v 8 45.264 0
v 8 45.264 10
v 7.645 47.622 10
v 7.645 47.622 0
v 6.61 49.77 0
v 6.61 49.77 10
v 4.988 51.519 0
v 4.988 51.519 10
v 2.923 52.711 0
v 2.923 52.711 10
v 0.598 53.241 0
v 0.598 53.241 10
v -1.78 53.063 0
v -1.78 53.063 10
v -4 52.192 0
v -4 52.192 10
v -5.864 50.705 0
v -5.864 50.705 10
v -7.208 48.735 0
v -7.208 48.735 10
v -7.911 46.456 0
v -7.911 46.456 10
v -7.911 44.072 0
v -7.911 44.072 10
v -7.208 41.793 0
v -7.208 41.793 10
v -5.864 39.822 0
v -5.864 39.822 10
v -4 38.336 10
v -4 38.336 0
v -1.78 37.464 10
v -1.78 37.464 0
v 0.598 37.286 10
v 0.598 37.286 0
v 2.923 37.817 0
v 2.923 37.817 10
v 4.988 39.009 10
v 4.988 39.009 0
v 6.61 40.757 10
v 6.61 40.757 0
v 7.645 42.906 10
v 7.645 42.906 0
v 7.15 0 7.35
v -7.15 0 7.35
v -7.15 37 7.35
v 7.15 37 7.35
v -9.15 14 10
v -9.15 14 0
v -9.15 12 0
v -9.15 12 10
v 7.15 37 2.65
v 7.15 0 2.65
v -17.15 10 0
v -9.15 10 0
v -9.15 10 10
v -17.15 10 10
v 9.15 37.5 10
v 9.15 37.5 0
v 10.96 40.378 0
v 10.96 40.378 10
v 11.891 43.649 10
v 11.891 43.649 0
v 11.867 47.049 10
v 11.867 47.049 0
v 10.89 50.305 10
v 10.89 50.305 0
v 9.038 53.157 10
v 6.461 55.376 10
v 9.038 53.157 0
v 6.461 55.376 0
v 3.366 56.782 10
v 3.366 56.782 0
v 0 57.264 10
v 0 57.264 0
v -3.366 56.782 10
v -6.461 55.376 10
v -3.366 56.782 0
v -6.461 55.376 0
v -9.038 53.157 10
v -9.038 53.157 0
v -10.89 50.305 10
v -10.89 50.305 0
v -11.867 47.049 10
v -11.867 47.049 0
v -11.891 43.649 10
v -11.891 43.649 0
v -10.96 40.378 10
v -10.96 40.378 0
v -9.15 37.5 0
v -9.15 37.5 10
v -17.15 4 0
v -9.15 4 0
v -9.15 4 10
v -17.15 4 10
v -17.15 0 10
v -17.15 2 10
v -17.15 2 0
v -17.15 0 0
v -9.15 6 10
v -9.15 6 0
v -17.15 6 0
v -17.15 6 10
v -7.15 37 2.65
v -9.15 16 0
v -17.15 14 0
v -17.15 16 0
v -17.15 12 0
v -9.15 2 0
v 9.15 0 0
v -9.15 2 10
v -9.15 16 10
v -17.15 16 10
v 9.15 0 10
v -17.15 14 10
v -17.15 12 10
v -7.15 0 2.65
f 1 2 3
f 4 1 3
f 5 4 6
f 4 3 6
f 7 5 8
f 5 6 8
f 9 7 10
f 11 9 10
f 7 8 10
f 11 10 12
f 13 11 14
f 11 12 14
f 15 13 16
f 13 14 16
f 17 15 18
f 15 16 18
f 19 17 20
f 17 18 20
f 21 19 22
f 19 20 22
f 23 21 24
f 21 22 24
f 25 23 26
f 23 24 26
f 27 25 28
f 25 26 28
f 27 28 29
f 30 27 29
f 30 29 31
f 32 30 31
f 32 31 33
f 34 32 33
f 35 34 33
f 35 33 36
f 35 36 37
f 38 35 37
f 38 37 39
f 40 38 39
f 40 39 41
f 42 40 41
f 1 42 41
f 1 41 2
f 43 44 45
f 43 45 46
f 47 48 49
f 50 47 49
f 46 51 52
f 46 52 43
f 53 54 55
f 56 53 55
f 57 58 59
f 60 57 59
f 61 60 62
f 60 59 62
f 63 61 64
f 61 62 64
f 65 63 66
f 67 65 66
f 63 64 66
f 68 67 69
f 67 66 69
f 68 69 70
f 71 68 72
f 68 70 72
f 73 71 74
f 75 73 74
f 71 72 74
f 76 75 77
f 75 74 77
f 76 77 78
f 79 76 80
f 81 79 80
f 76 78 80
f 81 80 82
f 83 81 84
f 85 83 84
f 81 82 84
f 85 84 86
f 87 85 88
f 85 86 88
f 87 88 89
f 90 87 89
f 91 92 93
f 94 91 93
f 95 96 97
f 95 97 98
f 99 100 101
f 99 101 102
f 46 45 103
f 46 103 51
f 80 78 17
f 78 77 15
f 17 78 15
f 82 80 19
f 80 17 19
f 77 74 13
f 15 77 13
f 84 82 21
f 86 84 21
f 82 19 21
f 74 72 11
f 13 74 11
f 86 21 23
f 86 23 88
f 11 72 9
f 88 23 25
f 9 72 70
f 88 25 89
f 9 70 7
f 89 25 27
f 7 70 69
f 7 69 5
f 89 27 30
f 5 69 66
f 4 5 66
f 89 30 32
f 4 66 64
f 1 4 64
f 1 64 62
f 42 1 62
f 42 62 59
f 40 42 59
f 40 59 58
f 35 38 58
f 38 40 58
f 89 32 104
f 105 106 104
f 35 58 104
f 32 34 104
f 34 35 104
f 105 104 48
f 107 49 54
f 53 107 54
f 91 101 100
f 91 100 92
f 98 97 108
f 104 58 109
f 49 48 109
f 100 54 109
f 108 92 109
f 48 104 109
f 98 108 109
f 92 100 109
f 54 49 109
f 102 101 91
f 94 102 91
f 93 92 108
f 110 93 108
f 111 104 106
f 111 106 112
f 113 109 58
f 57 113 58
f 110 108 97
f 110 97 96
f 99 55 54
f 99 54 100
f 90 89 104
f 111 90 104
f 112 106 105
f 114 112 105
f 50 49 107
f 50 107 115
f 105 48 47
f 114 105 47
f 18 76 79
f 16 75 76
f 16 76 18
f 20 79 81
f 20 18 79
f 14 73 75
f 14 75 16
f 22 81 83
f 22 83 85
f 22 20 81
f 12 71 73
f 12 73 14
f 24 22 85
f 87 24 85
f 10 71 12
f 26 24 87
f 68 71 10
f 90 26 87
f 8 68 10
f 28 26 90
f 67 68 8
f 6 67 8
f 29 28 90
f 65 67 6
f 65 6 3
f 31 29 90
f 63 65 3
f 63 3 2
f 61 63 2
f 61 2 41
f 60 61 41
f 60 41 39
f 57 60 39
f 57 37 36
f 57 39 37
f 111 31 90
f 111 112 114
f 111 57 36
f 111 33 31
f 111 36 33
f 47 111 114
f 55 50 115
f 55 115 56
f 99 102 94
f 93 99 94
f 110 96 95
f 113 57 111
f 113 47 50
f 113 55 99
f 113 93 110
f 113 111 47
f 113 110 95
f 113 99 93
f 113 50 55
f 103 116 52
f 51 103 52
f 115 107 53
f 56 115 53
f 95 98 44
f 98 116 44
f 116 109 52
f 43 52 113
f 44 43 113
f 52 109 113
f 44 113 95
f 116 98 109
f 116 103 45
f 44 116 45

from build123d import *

# Parameters (mm, degrees)
F1_DEPTH = 10
F2_R     = 8
F3_DEPTH = 10.001
F4_W     = 14.3
F4_H     = 4.7
F5_DEPTH = 37
F6_W     = 2
F6_H     = 10
F7_DEPTH = 8


with BuildPart() as f1:
    # F0 (on Top) → F1 (new body)
    with BuildSketch(Plane.XY):
        with BuildLine():
            Line((9.15, 0), (9.15, 37.5))
            ThreePointArc((9.15, 37.5), (0, 57.263859), (-9.15, 37.5))
            Line((-9.15, 37.5), (-9.15, 0))
            Line((-9.15, 0), (9.15, 0))
        make_face()
    extrude(amount=F1_DEPTH)

    # F2 (on face) → F3 (cut, through all)
    with BuildSketch(Plane.XY.offset(10)):
        with Locations((0, 45.263859)):
            Circle(F2_R)
    extrude(amount=-F3_DEPTH, mode=Mode.SUBTRACT)

    # F4 (on face) → F5 (cut)
    with BuildSketch(Plane.XZ):
        with Locations((0, 5)):
            Rectangle(F4_W, F4_H)
    extrude(amount=-F5_DEPTH, mode=Mode.SUBTRACT)

    # F6 (on face) → F7 (join)
    with BuildSketch(Plane(origin=(-9.15, 0, 0), x_dir=(0, -1, 0), z_dir=(-1, 0, 0))):
        with Locations((-1, 5)):
            Rectangle(F6_W, F6_H)
        with Locations((-5, 5)):
            Rectangle(F6_W, F6_H)
        with Locations((-11, 5)):
            Rectangle(F6_W, F6_H)
        with Locations((-15, 5)):
            Rectangle(F6_W, F6_H)
    extrude(amount=F7_DEPTH)


solid = f1.part
